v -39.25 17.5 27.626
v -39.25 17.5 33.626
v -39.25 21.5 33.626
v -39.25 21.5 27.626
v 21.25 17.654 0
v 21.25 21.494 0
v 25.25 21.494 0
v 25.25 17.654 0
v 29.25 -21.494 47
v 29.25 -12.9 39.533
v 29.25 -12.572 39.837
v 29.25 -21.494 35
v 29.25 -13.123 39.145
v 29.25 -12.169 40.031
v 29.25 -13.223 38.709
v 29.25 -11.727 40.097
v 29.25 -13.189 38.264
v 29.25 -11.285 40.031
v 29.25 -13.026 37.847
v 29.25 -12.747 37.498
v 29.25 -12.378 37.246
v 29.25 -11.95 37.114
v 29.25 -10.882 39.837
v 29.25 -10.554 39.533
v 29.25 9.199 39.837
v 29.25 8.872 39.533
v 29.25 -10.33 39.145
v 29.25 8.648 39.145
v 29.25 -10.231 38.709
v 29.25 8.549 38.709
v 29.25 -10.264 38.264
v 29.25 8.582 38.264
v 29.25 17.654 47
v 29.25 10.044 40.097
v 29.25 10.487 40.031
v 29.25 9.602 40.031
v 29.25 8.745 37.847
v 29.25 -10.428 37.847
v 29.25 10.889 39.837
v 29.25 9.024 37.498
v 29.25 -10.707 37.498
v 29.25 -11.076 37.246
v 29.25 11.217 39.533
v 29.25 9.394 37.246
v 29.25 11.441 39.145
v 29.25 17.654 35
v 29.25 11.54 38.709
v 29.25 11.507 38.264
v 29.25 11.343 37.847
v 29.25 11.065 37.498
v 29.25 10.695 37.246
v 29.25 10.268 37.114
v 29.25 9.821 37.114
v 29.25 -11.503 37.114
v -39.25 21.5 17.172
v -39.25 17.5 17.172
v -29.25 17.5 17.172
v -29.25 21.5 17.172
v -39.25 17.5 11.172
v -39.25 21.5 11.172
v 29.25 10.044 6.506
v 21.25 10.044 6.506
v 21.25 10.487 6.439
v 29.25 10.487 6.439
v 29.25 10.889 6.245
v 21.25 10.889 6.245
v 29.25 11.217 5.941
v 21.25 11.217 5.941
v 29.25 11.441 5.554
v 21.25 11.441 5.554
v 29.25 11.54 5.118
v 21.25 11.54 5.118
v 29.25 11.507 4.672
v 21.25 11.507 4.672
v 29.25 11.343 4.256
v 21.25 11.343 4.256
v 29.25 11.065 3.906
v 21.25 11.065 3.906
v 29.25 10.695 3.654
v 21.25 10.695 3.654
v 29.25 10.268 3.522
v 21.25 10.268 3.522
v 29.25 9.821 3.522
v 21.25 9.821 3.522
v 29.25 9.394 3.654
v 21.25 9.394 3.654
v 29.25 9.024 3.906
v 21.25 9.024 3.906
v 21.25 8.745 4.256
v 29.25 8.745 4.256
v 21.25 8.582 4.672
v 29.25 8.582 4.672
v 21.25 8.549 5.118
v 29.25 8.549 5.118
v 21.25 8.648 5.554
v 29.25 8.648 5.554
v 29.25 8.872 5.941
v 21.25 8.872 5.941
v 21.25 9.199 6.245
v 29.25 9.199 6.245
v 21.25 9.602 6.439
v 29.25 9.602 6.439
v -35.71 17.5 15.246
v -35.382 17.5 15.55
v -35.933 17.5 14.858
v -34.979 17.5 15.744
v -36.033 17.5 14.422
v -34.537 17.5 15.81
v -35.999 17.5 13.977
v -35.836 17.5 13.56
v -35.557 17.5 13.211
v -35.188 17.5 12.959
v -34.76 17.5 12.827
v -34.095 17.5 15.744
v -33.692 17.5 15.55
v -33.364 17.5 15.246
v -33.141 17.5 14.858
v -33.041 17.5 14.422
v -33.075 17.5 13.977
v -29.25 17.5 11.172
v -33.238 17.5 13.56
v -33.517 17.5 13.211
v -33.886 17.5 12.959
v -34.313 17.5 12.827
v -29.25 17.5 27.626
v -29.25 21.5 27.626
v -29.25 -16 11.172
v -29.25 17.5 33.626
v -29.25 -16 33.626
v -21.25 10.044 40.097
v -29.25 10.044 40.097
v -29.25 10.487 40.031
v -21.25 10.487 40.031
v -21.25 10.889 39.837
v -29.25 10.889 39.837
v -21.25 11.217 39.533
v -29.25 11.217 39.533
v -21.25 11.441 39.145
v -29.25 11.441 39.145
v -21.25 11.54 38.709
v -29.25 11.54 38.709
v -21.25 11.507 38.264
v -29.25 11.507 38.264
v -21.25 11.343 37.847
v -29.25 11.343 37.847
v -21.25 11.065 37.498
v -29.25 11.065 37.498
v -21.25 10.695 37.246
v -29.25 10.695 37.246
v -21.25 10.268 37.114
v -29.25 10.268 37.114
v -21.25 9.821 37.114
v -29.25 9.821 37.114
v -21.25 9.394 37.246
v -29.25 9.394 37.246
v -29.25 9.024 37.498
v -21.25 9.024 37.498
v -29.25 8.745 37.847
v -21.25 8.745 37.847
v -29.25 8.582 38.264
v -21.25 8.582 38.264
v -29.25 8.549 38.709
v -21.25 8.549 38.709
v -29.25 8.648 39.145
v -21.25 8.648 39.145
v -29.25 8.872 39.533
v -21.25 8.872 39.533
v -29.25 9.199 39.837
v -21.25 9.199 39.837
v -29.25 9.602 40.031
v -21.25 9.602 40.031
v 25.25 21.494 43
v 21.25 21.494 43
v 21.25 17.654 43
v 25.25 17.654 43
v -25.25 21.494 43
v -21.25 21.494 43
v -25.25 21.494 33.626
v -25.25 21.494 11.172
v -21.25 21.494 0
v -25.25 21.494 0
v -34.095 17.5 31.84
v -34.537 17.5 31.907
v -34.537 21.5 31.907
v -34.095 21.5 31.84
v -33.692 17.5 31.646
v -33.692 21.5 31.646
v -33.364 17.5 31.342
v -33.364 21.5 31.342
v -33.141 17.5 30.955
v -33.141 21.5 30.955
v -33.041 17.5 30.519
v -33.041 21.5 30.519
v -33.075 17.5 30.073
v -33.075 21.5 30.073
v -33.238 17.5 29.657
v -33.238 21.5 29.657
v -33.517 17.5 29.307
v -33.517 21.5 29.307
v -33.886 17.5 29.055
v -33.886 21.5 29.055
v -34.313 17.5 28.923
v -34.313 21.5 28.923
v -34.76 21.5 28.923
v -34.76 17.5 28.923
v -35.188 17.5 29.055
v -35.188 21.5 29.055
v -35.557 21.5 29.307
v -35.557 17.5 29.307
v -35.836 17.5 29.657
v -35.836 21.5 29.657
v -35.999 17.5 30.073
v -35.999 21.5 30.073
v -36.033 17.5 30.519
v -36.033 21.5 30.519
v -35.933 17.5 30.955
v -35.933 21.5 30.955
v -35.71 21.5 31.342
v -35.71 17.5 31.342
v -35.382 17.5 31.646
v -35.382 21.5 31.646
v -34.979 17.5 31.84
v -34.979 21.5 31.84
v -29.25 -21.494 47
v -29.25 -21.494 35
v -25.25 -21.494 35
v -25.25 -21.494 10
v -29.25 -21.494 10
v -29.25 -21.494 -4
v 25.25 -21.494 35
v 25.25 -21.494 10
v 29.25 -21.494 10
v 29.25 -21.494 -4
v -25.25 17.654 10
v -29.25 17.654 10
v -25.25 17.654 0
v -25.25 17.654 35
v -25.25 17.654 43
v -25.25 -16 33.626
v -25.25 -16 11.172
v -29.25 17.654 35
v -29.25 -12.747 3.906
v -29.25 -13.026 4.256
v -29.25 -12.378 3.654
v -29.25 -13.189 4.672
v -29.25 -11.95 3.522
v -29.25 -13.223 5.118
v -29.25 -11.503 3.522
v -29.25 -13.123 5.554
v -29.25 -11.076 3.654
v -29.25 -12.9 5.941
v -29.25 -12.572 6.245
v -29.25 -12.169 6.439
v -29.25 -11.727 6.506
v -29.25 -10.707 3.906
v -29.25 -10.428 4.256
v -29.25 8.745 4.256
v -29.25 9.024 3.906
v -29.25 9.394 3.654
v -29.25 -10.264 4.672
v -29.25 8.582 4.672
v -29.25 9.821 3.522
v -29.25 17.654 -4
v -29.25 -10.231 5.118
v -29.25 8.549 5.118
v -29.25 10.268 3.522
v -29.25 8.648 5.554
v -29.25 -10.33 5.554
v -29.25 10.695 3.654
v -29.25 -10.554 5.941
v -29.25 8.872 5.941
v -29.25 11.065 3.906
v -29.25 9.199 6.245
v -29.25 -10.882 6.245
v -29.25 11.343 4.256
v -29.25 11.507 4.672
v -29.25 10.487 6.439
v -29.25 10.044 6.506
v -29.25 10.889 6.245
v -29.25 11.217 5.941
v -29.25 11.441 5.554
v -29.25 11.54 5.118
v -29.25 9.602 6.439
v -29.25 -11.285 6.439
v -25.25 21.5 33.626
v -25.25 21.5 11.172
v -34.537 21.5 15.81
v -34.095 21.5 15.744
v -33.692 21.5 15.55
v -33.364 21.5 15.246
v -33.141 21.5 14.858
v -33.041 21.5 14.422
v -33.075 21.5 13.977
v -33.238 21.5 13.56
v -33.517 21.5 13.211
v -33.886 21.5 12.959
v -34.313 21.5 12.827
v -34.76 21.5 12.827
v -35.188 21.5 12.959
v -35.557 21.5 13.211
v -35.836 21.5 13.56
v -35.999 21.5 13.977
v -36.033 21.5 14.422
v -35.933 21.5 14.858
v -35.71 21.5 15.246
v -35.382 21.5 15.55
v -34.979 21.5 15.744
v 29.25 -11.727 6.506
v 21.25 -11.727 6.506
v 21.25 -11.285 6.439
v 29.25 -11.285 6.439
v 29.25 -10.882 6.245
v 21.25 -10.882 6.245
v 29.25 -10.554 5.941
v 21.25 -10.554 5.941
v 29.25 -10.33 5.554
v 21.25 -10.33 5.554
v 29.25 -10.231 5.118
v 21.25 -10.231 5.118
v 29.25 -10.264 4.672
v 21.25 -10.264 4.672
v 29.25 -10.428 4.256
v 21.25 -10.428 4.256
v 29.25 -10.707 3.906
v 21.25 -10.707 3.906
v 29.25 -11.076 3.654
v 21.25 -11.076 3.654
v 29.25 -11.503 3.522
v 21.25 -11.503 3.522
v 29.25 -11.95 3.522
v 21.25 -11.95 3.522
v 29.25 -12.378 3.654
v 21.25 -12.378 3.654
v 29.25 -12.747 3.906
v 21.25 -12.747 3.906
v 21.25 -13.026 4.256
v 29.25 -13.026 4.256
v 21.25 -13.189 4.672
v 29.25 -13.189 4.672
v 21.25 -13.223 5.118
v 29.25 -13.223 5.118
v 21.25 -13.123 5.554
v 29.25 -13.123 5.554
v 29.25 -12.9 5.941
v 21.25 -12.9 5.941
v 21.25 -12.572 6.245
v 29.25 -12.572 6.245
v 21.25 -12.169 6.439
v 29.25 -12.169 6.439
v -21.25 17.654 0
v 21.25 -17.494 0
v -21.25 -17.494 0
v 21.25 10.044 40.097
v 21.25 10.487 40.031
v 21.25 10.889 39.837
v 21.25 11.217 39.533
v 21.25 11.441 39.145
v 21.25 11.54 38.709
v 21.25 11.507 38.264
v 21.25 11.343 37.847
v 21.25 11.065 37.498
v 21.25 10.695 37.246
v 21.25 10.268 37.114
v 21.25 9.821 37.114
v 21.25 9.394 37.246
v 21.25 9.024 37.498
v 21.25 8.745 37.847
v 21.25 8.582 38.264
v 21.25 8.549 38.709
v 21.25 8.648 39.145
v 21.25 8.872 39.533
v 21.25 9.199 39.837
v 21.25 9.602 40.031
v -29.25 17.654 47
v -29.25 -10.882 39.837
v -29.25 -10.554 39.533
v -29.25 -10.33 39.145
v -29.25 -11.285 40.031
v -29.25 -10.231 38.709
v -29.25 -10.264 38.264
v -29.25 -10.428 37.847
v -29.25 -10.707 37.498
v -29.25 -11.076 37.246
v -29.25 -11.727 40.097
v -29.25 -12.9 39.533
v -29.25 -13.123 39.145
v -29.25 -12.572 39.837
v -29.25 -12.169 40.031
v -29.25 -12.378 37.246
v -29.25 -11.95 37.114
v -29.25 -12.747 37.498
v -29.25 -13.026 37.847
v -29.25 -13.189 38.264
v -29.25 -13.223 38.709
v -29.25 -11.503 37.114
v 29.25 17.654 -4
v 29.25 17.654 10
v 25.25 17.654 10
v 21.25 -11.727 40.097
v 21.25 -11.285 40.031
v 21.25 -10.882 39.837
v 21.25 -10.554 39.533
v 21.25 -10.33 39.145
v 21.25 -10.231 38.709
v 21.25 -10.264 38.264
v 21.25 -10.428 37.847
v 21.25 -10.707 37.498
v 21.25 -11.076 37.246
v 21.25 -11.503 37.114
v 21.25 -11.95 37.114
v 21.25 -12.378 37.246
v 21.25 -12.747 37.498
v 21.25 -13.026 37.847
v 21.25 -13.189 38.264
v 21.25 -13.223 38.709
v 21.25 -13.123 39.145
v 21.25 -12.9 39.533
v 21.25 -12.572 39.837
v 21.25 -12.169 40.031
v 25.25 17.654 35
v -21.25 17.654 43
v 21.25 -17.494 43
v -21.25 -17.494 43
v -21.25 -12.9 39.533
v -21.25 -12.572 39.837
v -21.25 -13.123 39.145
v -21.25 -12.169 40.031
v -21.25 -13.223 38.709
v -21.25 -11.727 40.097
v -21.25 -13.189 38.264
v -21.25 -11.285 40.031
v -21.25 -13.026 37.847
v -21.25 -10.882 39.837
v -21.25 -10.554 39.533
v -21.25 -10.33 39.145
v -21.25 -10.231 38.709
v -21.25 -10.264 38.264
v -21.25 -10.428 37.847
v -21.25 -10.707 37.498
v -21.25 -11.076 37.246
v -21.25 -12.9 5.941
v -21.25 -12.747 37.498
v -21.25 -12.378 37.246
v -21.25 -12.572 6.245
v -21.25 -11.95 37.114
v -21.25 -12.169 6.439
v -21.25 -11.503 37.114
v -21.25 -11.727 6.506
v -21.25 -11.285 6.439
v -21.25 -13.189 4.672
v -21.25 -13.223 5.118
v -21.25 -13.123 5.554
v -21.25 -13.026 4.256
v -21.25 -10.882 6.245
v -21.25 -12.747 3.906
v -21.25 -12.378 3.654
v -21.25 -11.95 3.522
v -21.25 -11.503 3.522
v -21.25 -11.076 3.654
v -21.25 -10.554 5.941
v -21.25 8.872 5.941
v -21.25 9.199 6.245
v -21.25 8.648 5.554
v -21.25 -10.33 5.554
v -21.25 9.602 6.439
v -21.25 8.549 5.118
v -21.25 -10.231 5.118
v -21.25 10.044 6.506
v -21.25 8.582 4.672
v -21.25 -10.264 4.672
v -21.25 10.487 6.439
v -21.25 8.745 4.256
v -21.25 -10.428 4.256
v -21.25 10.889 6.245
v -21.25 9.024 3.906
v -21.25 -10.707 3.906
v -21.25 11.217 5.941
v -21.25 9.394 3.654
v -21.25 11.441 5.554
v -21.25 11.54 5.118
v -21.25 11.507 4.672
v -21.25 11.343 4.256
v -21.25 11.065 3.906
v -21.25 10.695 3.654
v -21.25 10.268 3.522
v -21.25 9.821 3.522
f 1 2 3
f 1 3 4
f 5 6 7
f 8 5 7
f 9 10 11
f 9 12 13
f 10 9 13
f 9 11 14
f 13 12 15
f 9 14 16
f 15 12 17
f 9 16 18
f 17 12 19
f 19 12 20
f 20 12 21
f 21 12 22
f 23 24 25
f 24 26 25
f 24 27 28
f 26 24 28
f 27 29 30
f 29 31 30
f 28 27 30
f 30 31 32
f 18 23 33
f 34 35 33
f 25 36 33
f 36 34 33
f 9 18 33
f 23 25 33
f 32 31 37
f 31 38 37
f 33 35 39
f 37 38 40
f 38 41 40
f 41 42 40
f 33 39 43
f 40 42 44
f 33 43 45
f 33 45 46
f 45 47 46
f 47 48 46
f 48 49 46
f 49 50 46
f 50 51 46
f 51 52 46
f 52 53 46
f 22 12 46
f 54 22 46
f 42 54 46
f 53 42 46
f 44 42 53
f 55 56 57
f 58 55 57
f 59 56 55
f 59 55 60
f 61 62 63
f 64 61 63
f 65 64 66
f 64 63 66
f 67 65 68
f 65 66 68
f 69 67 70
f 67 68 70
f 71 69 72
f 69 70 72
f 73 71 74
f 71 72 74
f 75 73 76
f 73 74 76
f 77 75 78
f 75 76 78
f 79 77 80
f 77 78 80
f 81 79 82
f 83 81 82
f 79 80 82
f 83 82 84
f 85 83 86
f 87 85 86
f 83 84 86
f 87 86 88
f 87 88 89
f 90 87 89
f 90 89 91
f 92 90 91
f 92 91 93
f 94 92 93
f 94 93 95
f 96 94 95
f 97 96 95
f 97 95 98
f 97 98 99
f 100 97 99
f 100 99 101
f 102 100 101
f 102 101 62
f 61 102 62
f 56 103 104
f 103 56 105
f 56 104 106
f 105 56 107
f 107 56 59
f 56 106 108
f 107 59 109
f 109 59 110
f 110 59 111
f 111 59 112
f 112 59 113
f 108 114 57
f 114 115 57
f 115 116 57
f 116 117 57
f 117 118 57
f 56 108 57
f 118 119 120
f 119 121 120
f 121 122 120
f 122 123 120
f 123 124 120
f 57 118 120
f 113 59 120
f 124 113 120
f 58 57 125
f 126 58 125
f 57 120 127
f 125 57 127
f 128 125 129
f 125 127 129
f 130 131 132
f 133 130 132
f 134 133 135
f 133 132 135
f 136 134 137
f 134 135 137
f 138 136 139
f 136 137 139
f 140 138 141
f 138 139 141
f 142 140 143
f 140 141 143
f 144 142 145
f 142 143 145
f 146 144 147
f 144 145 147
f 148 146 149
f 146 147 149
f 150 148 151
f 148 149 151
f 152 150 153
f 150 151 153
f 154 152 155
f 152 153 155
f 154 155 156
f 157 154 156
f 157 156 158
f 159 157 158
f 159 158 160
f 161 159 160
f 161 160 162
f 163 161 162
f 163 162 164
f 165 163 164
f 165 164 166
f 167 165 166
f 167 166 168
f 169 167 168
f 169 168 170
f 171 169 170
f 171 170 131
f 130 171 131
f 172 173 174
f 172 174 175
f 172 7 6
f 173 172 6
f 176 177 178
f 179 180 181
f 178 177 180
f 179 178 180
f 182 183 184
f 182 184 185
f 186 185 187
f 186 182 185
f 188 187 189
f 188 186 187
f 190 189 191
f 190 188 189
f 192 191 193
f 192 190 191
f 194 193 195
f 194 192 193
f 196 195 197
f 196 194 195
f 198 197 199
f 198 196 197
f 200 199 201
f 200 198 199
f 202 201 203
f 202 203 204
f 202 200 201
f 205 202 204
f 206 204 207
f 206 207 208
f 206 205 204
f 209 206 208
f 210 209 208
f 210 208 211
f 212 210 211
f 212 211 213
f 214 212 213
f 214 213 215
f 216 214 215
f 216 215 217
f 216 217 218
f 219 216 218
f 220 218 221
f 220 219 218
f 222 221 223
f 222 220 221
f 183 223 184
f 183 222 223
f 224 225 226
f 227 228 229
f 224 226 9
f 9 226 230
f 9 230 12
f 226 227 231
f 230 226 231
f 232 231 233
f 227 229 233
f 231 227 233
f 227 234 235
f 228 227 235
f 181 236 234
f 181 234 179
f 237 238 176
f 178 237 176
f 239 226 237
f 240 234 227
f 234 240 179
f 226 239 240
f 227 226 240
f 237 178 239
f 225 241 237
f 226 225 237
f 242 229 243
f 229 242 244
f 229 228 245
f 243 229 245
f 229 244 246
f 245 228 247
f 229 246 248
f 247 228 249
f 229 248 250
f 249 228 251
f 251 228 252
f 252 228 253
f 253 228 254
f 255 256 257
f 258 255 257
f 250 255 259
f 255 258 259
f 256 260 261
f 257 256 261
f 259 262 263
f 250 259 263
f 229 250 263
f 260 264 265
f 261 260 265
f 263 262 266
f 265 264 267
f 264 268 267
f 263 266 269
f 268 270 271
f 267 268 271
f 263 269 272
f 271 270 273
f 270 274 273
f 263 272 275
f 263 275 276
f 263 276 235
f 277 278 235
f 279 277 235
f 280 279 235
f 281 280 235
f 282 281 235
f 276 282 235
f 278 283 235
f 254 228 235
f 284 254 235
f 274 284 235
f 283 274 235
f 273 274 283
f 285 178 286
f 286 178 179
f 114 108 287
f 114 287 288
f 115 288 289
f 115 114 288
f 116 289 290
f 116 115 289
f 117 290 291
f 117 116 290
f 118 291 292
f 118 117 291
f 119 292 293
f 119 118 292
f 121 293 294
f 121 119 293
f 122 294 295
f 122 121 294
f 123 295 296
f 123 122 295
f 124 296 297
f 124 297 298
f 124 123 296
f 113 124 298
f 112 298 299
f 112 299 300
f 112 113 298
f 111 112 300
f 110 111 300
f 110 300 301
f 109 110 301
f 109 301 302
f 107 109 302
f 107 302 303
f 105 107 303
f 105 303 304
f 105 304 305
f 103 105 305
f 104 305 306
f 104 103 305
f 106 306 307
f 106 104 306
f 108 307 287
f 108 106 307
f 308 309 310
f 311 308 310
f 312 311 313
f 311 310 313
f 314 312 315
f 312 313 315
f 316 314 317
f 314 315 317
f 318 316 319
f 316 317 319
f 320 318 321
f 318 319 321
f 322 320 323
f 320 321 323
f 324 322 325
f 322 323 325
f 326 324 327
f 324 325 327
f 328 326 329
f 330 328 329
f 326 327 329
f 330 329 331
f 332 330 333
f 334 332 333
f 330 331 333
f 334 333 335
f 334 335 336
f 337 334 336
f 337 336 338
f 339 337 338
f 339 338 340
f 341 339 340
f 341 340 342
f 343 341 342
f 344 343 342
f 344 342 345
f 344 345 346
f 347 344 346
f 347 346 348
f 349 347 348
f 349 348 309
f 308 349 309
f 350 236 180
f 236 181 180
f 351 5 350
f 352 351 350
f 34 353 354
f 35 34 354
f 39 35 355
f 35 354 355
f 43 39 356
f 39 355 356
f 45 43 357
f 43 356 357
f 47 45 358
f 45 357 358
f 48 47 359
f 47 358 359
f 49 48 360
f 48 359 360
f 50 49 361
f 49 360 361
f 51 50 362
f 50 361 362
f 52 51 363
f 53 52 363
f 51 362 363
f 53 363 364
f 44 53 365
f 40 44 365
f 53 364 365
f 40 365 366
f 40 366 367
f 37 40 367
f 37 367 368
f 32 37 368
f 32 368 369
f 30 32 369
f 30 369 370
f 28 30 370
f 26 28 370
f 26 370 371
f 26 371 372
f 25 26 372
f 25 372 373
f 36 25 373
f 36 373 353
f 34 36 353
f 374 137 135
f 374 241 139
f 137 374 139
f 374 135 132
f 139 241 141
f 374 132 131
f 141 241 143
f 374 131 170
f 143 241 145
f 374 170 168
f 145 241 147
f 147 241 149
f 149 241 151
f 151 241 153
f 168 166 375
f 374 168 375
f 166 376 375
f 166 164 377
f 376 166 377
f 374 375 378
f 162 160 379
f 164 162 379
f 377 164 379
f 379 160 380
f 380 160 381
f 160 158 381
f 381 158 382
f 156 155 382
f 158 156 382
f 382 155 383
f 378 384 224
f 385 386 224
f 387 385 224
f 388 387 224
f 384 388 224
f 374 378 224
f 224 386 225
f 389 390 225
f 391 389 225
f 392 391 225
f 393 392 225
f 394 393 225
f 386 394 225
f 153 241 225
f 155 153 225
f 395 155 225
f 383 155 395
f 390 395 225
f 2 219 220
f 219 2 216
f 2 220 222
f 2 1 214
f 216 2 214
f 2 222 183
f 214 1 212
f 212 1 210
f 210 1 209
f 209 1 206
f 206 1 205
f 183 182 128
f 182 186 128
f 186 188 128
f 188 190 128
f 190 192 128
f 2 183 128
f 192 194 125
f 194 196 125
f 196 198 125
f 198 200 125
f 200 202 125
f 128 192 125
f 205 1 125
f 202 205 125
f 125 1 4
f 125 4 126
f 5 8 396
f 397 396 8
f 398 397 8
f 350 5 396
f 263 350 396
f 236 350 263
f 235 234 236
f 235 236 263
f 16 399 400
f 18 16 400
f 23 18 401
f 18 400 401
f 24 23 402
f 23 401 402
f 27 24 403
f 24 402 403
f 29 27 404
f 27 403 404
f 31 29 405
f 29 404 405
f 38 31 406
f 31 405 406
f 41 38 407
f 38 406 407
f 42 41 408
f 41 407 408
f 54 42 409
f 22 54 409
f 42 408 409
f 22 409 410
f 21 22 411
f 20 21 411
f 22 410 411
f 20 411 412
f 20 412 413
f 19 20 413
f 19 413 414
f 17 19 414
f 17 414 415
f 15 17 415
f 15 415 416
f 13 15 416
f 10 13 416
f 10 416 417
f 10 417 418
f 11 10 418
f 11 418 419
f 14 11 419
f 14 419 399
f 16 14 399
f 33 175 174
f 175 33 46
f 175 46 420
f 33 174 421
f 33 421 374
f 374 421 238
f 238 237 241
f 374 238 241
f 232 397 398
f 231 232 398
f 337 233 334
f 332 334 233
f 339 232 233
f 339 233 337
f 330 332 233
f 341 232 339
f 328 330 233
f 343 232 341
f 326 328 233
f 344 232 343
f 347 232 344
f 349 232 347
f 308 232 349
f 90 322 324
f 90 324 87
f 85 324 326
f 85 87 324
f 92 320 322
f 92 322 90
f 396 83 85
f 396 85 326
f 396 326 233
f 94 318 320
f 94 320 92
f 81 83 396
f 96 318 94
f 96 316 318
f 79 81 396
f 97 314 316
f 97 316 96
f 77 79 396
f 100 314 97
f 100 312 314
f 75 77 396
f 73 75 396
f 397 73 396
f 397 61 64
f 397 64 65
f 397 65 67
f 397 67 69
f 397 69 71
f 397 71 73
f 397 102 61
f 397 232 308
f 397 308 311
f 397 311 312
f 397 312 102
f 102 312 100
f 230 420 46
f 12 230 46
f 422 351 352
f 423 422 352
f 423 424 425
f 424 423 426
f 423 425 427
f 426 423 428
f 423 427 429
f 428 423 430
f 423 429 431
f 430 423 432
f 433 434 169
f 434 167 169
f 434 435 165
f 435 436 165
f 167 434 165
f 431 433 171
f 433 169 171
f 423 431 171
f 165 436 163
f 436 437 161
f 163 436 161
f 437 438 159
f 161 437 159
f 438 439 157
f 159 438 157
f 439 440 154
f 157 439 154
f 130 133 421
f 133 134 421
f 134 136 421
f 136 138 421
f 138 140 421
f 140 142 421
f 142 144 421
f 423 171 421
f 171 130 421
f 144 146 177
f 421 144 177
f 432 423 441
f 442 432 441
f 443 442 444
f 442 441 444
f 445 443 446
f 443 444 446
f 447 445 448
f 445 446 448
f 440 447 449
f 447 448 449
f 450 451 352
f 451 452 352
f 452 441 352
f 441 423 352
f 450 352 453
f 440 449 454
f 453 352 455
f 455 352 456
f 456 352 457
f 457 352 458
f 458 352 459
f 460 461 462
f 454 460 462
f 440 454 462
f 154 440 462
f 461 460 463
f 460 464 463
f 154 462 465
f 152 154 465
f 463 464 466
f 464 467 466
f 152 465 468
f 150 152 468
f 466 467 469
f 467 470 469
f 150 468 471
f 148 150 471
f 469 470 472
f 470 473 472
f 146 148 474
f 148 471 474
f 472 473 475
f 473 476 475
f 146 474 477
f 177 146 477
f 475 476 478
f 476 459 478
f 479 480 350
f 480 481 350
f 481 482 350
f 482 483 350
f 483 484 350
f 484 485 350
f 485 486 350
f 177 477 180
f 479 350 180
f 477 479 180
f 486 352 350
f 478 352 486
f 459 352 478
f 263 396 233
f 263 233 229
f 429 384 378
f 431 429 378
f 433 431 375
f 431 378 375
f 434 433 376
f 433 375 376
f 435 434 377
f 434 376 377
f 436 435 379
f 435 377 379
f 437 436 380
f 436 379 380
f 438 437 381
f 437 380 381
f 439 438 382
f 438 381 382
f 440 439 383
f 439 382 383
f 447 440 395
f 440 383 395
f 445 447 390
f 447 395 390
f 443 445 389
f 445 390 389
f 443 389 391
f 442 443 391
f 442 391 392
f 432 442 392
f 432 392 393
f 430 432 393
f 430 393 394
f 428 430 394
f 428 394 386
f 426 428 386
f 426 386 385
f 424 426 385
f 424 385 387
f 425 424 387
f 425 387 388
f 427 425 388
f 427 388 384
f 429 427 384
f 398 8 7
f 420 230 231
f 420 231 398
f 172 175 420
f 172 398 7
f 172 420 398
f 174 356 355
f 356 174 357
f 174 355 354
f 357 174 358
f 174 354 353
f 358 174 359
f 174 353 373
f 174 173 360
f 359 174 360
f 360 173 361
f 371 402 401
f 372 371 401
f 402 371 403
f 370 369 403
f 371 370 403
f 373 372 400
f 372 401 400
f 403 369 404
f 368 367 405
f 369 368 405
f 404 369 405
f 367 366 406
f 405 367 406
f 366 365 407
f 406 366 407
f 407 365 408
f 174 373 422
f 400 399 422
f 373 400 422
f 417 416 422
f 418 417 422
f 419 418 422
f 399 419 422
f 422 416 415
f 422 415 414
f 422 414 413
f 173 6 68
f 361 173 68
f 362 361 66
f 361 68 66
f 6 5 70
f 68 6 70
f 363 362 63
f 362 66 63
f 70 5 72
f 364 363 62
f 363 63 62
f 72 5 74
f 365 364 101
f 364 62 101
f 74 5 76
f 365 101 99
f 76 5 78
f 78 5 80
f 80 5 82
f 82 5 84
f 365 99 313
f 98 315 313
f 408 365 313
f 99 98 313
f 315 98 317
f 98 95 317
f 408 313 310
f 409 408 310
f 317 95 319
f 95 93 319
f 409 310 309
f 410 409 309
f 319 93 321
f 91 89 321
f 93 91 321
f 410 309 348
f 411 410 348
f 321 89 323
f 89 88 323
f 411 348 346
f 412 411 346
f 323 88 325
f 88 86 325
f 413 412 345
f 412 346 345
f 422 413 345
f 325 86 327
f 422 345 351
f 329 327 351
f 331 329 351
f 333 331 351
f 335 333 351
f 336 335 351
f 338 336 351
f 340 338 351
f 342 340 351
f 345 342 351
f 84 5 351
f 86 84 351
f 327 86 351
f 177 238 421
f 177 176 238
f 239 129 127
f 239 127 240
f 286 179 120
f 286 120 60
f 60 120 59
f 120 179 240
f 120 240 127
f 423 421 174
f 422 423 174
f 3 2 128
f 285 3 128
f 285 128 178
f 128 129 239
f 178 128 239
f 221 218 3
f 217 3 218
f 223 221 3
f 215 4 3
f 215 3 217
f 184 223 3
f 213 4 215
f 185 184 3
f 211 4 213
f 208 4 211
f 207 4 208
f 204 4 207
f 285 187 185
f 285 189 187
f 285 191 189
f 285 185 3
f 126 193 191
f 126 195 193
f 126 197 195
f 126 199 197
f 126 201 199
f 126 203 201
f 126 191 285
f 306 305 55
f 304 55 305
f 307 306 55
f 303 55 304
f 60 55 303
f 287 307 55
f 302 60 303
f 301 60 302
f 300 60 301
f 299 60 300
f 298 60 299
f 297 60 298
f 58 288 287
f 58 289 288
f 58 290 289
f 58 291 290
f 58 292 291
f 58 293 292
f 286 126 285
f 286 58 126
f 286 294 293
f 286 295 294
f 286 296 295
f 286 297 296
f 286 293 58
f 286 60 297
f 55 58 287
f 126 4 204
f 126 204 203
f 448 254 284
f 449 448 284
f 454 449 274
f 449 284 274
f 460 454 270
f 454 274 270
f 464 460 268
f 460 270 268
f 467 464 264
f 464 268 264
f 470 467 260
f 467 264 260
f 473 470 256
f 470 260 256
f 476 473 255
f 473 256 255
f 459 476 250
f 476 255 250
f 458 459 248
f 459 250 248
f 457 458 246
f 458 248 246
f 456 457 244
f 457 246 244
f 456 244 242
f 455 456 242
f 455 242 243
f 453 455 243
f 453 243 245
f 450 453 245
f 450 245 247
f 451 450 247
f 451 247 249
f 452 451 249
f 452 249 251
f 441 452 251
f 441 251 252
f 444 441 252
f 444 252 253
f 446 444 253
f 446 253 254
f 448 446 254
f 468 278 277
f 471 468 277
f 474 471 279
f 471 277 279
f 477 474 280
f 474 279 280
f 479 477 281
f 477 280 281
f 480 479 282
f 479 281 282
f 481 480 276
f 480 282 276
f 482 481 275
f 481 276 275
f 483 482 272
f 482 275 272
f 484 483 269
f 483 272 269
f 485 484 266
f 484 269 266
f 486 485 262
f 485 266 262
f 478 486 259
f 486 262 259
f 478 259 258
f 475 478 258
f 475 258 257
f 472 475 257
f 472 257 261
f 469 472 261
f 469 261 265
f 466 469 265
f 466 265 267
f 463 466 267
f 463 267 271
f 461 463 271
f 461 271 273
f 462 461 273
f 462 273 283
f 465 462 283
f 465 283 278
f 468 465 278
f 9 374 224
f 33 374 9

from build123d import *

# Parameters (mm, degrees)
BOSS_EXTRUDE1_DEPTH      = 43
SKETCH4_W                = 50.5
SKETCH4_H                = 39.147537046
BOSS_EXTRUDE2_DEPTH      = 4
SKETCH5_W                = 50.5
SKETCH5_H                = 39.147537046
BOSS_EXTRUDE3_DEPTH      = 4
BOSS_EXTRUDE4_DEPTH      = 17.5
BOSS_EXTRUDE4_DEPTH_BACK = 16
BOSS_EXTRUDE5_START      = 17.5
SKETCH3_3_W              = 10
SKETCH3_3_H              = 6
SKETCH3_3_R              = 1.5
BOSS_EXTRUDE5_DEPTH      = 4
BOSS_EXTRUDE5_2_DEPTH    = 4
BOSS_EXTRUDE6_START      = 17.5
BOSS_EXTRUDE6_DEPTH      = 4
BOSS_EXTRUDE7_DEPTH      = 4
BOSS_EXTRUDE7_DEPTH_BACK = 10
SKETCH5_3_W              = 4
SKETCH5_3_H              = 39.147537046
BOSS_EXTRUDE8_DEPTH      = 4
BOSS_EXTRUDE8_DEPTH_BACK = 8
SKETCH8_R                = 1.5
CUT_EXTRUDE1_DEPTH       = 79.060873682
SKETCH11_R               = 1.5
CUT_EXTRUDE2_DEPTH       = 79.060873682


with BuildPart() as part:
    # Sketch1 → Boss-Extrude1 (new body)
    with BuildSketch(Plane.XY):
        Polygon((-21.25, -17.493697991), (-21.25, 21.493697991), (-25.25, 21.493697991), (-25.25, -21.493697991), (25.25, -21.493697991), (25.25, 21.493697991), (21.25, 21.493697991), (21.25, -17.493697991), align=None)
    extrude(amount=BOSS_EXTRUDE1_DEPTH)

    # Sketch4 → Boss-Extrude2 (add)
    with BuildSketch(Plane.XY.offset(43)):
        with Locations((0, -1.919929468)):
            Rectangle(SKETCH4_W, SKETCH4_H)
    extrude(amount=BOSS_EXTRUDE2_DEPTH)

    # Sketch5 → Boss-Extrude3 (add)
    with BuildSketch(Plane(origin=(0, 0, 0), x_dir=(-1, 0, 0), z_dir=(0, 0, -1))):
        with Locations((0, -1.919929468)):
            Rectangle(SKETCH5_W, SKETCH5_H)
    extrude(amount=BOSS_EXTRUDE3_DEPTH)


with BuildPart() as boss_extrude4_tool:
    # Sketch3 → Boss-Extrude4 (new, two sides: drawn at the far end of the back side and taken through both)
    with BuildSketch(Plane(origin=(0, 0, 0), x_dir=(1, 0, 0), z_dir=(0, 1, 0)).offset(-BOSS_EXTRUDE4_DEPTH_BACK)):
        Polygon((-29.250003781, -33.625807881), (-25.250003781, -33.625807881), (-25.250003781, -11.171909281), (-29.250003781, -11.171909281), (-29.250003781, -17.171909281), (-29.250003781, -27.625807881), align=None)
    extrude(amount=BOSS_EXTRUDE4_DEPTH + BOSS_EXTRUDE4_DEPTH_BACK)


with BuildPart() as part_1:
    add(part.part)


with BuildPart() as part_2:
    # Boss-Extrude4: joined with boss_extrude4_tool
    add(part_1.part.fuse(boss_extrude4_tool.part, tol=0.00001))


with BuildPart() as body_2:
    # Sketch3<3> → Boss-Extrude5 (new body)
    with BuildSketch(Plane(origin=(0, 0, 0), x_dir=(1, 0, 0), z_dir=(0, 1, 0)).offset(BOSS_EXTRUDE5_START)):
        with Locations((-34.250003781, -30.625807881)):
            Rectangle(SKETCH3_3_W, SKETCH3_3_H)
        with Locations(Location((-34.536906803, -30.406566851, 0), (0, 0, 270))):
            Circle(SKETCH3_3_R, mode=Mode.SUBTRACT)
    extrude(amount=BOSS_EXTRUDE5_DEPTH)


with BuildPart() as body_3:
    # Sketch3<3> → Boss-Extrude5 2 (new body)
    with BuildSketch(Plane(origin=(0, 0, 0), x_dir=(1, 0, 0), z_dir=(0, 1, 0)).offset(BOSS_EXTRUDE5_START)):
        with Locations((-34.250003781, -14.171909281)):
            Rectangle(SKETCH3_3_W, SKETCH3_3_H)
        with Locations(Location((-34.536906803, -14.310361699, 0), (0, 0, 270))):
            Circle(SKETCH3_3_R, mode=Mode.SUBTRACT)
    extrude(amount=BOSS_EXTRUDE5_2_DEPTH)


with BuildPart() as boss_extrude6_tool:
    # Sketch3<4> → Boss-Extrude6 (new body)
    with BuildSketch(Plane(origin=(0, 0, 0), x_dir=(1, 0, 0), z_dir=(0, 1, 0)).offset(BOSS_EXTRUDE6_START)):
        Polygon((-29.250003781, -33.625807881), (-25.250003781, -33.625807881), (-25.250003781, -11.171909281), (-29.250003781, -11.171909281), (-29.250003781, -17.171909281), (-29.250003781, -27.625807881), align=None)
    extrude(amount=BOSS_EXTRUDE6_DEPTH)


with BuildPart() as part_3:
    add(part_2.part)


with BuildPart() as part_4:
    # Boss-Extrude6: joined with boss_extrude6_tool
    add(part_3.part.fuse(boss_extrude6_tool.part, body_2.part, body_3.part, tol=0.00001))

    # Sketch5<3> → Boss-Extrude7 (add, two sides: drawn at the far end of the back side and taken through both)
    with BuildSketch(Plane(origin=(0, 0, 0), x_dir=(-1, 0, 0), z_dir=(0, 0, -1)).offset(-BOSS_EXTRUDE7_DEPTH_BACK)):
        with Locations((-27.25, -1.919929468)):
            Rectangle(SKETCH5_3_W, SKETCH5_3_H)
        with Locations((27.25, -1.919929468)):
            Rectangle(SKETCH5_3_W, SKETCH5_3_H)
    extrude(amount=BOSS_EXTRUDE7_DEPTH + BOSS_EXTRUDE7_DEPTH_BACK)

    # Sketch4<3> → Boss-Extrude8 (add, two sides: drawn at the far end of the back side and taken through both)
    with BuildSketch(Plane.XY.offset(43).offset(-BOSS_EXTRUDE8_DEPTH_BACK)):
        Polygon((29.25, 17.653839055), (25.25, 17.653839055), (25.25, -21.493697991), (29.25, -21.493697991), (29.25, -17.493697991), (29.25, 13.653839055), align=None)
        Polygon((-25.25, -21.493697991), (-25.25, 17.653839055), (-29.25, 17.653839055), (-29.25, 13.653839055), (-29.25, -17.493697991), (-29.25, -21.493697991), align=None)
    extrude(amount=BOSS_EXTRUDE8_DEPTH + BOSS_EXTRUDE8_DEPTH_BACK)

    # Sketch8 → Cut-Extrude1 (cut, through all)
    with BuildSketch(Plane.ZY.offset(29.25)):
        with Locations((5.005736184, 10.04444872)):
            Circle(SKETCH8_R)
        with Locations((5.005736184, -11.726773354)):
            Circle(SKETCH8_R)
    extrude(amount=-CUT_EXTRUDE1_DEPTH, mode=Mode.SUBTRACT)

    # Sketch11 → Cut-Extrude2 (cut, through all)
    with BuildSketch(Plane.ZY.offset(29.25)):
        with Locations((38.59734476, -11.726773354)):
            Circle(SKETCH11_R)
        with Locations((38.59734476, 10.04444872)):
            Circle(SKETCH11_R)
    extrude(amount=-CUT_EXTRUDE2_DEPTH, mode=Mode.SUBTRACT)


solid = part_4.part
